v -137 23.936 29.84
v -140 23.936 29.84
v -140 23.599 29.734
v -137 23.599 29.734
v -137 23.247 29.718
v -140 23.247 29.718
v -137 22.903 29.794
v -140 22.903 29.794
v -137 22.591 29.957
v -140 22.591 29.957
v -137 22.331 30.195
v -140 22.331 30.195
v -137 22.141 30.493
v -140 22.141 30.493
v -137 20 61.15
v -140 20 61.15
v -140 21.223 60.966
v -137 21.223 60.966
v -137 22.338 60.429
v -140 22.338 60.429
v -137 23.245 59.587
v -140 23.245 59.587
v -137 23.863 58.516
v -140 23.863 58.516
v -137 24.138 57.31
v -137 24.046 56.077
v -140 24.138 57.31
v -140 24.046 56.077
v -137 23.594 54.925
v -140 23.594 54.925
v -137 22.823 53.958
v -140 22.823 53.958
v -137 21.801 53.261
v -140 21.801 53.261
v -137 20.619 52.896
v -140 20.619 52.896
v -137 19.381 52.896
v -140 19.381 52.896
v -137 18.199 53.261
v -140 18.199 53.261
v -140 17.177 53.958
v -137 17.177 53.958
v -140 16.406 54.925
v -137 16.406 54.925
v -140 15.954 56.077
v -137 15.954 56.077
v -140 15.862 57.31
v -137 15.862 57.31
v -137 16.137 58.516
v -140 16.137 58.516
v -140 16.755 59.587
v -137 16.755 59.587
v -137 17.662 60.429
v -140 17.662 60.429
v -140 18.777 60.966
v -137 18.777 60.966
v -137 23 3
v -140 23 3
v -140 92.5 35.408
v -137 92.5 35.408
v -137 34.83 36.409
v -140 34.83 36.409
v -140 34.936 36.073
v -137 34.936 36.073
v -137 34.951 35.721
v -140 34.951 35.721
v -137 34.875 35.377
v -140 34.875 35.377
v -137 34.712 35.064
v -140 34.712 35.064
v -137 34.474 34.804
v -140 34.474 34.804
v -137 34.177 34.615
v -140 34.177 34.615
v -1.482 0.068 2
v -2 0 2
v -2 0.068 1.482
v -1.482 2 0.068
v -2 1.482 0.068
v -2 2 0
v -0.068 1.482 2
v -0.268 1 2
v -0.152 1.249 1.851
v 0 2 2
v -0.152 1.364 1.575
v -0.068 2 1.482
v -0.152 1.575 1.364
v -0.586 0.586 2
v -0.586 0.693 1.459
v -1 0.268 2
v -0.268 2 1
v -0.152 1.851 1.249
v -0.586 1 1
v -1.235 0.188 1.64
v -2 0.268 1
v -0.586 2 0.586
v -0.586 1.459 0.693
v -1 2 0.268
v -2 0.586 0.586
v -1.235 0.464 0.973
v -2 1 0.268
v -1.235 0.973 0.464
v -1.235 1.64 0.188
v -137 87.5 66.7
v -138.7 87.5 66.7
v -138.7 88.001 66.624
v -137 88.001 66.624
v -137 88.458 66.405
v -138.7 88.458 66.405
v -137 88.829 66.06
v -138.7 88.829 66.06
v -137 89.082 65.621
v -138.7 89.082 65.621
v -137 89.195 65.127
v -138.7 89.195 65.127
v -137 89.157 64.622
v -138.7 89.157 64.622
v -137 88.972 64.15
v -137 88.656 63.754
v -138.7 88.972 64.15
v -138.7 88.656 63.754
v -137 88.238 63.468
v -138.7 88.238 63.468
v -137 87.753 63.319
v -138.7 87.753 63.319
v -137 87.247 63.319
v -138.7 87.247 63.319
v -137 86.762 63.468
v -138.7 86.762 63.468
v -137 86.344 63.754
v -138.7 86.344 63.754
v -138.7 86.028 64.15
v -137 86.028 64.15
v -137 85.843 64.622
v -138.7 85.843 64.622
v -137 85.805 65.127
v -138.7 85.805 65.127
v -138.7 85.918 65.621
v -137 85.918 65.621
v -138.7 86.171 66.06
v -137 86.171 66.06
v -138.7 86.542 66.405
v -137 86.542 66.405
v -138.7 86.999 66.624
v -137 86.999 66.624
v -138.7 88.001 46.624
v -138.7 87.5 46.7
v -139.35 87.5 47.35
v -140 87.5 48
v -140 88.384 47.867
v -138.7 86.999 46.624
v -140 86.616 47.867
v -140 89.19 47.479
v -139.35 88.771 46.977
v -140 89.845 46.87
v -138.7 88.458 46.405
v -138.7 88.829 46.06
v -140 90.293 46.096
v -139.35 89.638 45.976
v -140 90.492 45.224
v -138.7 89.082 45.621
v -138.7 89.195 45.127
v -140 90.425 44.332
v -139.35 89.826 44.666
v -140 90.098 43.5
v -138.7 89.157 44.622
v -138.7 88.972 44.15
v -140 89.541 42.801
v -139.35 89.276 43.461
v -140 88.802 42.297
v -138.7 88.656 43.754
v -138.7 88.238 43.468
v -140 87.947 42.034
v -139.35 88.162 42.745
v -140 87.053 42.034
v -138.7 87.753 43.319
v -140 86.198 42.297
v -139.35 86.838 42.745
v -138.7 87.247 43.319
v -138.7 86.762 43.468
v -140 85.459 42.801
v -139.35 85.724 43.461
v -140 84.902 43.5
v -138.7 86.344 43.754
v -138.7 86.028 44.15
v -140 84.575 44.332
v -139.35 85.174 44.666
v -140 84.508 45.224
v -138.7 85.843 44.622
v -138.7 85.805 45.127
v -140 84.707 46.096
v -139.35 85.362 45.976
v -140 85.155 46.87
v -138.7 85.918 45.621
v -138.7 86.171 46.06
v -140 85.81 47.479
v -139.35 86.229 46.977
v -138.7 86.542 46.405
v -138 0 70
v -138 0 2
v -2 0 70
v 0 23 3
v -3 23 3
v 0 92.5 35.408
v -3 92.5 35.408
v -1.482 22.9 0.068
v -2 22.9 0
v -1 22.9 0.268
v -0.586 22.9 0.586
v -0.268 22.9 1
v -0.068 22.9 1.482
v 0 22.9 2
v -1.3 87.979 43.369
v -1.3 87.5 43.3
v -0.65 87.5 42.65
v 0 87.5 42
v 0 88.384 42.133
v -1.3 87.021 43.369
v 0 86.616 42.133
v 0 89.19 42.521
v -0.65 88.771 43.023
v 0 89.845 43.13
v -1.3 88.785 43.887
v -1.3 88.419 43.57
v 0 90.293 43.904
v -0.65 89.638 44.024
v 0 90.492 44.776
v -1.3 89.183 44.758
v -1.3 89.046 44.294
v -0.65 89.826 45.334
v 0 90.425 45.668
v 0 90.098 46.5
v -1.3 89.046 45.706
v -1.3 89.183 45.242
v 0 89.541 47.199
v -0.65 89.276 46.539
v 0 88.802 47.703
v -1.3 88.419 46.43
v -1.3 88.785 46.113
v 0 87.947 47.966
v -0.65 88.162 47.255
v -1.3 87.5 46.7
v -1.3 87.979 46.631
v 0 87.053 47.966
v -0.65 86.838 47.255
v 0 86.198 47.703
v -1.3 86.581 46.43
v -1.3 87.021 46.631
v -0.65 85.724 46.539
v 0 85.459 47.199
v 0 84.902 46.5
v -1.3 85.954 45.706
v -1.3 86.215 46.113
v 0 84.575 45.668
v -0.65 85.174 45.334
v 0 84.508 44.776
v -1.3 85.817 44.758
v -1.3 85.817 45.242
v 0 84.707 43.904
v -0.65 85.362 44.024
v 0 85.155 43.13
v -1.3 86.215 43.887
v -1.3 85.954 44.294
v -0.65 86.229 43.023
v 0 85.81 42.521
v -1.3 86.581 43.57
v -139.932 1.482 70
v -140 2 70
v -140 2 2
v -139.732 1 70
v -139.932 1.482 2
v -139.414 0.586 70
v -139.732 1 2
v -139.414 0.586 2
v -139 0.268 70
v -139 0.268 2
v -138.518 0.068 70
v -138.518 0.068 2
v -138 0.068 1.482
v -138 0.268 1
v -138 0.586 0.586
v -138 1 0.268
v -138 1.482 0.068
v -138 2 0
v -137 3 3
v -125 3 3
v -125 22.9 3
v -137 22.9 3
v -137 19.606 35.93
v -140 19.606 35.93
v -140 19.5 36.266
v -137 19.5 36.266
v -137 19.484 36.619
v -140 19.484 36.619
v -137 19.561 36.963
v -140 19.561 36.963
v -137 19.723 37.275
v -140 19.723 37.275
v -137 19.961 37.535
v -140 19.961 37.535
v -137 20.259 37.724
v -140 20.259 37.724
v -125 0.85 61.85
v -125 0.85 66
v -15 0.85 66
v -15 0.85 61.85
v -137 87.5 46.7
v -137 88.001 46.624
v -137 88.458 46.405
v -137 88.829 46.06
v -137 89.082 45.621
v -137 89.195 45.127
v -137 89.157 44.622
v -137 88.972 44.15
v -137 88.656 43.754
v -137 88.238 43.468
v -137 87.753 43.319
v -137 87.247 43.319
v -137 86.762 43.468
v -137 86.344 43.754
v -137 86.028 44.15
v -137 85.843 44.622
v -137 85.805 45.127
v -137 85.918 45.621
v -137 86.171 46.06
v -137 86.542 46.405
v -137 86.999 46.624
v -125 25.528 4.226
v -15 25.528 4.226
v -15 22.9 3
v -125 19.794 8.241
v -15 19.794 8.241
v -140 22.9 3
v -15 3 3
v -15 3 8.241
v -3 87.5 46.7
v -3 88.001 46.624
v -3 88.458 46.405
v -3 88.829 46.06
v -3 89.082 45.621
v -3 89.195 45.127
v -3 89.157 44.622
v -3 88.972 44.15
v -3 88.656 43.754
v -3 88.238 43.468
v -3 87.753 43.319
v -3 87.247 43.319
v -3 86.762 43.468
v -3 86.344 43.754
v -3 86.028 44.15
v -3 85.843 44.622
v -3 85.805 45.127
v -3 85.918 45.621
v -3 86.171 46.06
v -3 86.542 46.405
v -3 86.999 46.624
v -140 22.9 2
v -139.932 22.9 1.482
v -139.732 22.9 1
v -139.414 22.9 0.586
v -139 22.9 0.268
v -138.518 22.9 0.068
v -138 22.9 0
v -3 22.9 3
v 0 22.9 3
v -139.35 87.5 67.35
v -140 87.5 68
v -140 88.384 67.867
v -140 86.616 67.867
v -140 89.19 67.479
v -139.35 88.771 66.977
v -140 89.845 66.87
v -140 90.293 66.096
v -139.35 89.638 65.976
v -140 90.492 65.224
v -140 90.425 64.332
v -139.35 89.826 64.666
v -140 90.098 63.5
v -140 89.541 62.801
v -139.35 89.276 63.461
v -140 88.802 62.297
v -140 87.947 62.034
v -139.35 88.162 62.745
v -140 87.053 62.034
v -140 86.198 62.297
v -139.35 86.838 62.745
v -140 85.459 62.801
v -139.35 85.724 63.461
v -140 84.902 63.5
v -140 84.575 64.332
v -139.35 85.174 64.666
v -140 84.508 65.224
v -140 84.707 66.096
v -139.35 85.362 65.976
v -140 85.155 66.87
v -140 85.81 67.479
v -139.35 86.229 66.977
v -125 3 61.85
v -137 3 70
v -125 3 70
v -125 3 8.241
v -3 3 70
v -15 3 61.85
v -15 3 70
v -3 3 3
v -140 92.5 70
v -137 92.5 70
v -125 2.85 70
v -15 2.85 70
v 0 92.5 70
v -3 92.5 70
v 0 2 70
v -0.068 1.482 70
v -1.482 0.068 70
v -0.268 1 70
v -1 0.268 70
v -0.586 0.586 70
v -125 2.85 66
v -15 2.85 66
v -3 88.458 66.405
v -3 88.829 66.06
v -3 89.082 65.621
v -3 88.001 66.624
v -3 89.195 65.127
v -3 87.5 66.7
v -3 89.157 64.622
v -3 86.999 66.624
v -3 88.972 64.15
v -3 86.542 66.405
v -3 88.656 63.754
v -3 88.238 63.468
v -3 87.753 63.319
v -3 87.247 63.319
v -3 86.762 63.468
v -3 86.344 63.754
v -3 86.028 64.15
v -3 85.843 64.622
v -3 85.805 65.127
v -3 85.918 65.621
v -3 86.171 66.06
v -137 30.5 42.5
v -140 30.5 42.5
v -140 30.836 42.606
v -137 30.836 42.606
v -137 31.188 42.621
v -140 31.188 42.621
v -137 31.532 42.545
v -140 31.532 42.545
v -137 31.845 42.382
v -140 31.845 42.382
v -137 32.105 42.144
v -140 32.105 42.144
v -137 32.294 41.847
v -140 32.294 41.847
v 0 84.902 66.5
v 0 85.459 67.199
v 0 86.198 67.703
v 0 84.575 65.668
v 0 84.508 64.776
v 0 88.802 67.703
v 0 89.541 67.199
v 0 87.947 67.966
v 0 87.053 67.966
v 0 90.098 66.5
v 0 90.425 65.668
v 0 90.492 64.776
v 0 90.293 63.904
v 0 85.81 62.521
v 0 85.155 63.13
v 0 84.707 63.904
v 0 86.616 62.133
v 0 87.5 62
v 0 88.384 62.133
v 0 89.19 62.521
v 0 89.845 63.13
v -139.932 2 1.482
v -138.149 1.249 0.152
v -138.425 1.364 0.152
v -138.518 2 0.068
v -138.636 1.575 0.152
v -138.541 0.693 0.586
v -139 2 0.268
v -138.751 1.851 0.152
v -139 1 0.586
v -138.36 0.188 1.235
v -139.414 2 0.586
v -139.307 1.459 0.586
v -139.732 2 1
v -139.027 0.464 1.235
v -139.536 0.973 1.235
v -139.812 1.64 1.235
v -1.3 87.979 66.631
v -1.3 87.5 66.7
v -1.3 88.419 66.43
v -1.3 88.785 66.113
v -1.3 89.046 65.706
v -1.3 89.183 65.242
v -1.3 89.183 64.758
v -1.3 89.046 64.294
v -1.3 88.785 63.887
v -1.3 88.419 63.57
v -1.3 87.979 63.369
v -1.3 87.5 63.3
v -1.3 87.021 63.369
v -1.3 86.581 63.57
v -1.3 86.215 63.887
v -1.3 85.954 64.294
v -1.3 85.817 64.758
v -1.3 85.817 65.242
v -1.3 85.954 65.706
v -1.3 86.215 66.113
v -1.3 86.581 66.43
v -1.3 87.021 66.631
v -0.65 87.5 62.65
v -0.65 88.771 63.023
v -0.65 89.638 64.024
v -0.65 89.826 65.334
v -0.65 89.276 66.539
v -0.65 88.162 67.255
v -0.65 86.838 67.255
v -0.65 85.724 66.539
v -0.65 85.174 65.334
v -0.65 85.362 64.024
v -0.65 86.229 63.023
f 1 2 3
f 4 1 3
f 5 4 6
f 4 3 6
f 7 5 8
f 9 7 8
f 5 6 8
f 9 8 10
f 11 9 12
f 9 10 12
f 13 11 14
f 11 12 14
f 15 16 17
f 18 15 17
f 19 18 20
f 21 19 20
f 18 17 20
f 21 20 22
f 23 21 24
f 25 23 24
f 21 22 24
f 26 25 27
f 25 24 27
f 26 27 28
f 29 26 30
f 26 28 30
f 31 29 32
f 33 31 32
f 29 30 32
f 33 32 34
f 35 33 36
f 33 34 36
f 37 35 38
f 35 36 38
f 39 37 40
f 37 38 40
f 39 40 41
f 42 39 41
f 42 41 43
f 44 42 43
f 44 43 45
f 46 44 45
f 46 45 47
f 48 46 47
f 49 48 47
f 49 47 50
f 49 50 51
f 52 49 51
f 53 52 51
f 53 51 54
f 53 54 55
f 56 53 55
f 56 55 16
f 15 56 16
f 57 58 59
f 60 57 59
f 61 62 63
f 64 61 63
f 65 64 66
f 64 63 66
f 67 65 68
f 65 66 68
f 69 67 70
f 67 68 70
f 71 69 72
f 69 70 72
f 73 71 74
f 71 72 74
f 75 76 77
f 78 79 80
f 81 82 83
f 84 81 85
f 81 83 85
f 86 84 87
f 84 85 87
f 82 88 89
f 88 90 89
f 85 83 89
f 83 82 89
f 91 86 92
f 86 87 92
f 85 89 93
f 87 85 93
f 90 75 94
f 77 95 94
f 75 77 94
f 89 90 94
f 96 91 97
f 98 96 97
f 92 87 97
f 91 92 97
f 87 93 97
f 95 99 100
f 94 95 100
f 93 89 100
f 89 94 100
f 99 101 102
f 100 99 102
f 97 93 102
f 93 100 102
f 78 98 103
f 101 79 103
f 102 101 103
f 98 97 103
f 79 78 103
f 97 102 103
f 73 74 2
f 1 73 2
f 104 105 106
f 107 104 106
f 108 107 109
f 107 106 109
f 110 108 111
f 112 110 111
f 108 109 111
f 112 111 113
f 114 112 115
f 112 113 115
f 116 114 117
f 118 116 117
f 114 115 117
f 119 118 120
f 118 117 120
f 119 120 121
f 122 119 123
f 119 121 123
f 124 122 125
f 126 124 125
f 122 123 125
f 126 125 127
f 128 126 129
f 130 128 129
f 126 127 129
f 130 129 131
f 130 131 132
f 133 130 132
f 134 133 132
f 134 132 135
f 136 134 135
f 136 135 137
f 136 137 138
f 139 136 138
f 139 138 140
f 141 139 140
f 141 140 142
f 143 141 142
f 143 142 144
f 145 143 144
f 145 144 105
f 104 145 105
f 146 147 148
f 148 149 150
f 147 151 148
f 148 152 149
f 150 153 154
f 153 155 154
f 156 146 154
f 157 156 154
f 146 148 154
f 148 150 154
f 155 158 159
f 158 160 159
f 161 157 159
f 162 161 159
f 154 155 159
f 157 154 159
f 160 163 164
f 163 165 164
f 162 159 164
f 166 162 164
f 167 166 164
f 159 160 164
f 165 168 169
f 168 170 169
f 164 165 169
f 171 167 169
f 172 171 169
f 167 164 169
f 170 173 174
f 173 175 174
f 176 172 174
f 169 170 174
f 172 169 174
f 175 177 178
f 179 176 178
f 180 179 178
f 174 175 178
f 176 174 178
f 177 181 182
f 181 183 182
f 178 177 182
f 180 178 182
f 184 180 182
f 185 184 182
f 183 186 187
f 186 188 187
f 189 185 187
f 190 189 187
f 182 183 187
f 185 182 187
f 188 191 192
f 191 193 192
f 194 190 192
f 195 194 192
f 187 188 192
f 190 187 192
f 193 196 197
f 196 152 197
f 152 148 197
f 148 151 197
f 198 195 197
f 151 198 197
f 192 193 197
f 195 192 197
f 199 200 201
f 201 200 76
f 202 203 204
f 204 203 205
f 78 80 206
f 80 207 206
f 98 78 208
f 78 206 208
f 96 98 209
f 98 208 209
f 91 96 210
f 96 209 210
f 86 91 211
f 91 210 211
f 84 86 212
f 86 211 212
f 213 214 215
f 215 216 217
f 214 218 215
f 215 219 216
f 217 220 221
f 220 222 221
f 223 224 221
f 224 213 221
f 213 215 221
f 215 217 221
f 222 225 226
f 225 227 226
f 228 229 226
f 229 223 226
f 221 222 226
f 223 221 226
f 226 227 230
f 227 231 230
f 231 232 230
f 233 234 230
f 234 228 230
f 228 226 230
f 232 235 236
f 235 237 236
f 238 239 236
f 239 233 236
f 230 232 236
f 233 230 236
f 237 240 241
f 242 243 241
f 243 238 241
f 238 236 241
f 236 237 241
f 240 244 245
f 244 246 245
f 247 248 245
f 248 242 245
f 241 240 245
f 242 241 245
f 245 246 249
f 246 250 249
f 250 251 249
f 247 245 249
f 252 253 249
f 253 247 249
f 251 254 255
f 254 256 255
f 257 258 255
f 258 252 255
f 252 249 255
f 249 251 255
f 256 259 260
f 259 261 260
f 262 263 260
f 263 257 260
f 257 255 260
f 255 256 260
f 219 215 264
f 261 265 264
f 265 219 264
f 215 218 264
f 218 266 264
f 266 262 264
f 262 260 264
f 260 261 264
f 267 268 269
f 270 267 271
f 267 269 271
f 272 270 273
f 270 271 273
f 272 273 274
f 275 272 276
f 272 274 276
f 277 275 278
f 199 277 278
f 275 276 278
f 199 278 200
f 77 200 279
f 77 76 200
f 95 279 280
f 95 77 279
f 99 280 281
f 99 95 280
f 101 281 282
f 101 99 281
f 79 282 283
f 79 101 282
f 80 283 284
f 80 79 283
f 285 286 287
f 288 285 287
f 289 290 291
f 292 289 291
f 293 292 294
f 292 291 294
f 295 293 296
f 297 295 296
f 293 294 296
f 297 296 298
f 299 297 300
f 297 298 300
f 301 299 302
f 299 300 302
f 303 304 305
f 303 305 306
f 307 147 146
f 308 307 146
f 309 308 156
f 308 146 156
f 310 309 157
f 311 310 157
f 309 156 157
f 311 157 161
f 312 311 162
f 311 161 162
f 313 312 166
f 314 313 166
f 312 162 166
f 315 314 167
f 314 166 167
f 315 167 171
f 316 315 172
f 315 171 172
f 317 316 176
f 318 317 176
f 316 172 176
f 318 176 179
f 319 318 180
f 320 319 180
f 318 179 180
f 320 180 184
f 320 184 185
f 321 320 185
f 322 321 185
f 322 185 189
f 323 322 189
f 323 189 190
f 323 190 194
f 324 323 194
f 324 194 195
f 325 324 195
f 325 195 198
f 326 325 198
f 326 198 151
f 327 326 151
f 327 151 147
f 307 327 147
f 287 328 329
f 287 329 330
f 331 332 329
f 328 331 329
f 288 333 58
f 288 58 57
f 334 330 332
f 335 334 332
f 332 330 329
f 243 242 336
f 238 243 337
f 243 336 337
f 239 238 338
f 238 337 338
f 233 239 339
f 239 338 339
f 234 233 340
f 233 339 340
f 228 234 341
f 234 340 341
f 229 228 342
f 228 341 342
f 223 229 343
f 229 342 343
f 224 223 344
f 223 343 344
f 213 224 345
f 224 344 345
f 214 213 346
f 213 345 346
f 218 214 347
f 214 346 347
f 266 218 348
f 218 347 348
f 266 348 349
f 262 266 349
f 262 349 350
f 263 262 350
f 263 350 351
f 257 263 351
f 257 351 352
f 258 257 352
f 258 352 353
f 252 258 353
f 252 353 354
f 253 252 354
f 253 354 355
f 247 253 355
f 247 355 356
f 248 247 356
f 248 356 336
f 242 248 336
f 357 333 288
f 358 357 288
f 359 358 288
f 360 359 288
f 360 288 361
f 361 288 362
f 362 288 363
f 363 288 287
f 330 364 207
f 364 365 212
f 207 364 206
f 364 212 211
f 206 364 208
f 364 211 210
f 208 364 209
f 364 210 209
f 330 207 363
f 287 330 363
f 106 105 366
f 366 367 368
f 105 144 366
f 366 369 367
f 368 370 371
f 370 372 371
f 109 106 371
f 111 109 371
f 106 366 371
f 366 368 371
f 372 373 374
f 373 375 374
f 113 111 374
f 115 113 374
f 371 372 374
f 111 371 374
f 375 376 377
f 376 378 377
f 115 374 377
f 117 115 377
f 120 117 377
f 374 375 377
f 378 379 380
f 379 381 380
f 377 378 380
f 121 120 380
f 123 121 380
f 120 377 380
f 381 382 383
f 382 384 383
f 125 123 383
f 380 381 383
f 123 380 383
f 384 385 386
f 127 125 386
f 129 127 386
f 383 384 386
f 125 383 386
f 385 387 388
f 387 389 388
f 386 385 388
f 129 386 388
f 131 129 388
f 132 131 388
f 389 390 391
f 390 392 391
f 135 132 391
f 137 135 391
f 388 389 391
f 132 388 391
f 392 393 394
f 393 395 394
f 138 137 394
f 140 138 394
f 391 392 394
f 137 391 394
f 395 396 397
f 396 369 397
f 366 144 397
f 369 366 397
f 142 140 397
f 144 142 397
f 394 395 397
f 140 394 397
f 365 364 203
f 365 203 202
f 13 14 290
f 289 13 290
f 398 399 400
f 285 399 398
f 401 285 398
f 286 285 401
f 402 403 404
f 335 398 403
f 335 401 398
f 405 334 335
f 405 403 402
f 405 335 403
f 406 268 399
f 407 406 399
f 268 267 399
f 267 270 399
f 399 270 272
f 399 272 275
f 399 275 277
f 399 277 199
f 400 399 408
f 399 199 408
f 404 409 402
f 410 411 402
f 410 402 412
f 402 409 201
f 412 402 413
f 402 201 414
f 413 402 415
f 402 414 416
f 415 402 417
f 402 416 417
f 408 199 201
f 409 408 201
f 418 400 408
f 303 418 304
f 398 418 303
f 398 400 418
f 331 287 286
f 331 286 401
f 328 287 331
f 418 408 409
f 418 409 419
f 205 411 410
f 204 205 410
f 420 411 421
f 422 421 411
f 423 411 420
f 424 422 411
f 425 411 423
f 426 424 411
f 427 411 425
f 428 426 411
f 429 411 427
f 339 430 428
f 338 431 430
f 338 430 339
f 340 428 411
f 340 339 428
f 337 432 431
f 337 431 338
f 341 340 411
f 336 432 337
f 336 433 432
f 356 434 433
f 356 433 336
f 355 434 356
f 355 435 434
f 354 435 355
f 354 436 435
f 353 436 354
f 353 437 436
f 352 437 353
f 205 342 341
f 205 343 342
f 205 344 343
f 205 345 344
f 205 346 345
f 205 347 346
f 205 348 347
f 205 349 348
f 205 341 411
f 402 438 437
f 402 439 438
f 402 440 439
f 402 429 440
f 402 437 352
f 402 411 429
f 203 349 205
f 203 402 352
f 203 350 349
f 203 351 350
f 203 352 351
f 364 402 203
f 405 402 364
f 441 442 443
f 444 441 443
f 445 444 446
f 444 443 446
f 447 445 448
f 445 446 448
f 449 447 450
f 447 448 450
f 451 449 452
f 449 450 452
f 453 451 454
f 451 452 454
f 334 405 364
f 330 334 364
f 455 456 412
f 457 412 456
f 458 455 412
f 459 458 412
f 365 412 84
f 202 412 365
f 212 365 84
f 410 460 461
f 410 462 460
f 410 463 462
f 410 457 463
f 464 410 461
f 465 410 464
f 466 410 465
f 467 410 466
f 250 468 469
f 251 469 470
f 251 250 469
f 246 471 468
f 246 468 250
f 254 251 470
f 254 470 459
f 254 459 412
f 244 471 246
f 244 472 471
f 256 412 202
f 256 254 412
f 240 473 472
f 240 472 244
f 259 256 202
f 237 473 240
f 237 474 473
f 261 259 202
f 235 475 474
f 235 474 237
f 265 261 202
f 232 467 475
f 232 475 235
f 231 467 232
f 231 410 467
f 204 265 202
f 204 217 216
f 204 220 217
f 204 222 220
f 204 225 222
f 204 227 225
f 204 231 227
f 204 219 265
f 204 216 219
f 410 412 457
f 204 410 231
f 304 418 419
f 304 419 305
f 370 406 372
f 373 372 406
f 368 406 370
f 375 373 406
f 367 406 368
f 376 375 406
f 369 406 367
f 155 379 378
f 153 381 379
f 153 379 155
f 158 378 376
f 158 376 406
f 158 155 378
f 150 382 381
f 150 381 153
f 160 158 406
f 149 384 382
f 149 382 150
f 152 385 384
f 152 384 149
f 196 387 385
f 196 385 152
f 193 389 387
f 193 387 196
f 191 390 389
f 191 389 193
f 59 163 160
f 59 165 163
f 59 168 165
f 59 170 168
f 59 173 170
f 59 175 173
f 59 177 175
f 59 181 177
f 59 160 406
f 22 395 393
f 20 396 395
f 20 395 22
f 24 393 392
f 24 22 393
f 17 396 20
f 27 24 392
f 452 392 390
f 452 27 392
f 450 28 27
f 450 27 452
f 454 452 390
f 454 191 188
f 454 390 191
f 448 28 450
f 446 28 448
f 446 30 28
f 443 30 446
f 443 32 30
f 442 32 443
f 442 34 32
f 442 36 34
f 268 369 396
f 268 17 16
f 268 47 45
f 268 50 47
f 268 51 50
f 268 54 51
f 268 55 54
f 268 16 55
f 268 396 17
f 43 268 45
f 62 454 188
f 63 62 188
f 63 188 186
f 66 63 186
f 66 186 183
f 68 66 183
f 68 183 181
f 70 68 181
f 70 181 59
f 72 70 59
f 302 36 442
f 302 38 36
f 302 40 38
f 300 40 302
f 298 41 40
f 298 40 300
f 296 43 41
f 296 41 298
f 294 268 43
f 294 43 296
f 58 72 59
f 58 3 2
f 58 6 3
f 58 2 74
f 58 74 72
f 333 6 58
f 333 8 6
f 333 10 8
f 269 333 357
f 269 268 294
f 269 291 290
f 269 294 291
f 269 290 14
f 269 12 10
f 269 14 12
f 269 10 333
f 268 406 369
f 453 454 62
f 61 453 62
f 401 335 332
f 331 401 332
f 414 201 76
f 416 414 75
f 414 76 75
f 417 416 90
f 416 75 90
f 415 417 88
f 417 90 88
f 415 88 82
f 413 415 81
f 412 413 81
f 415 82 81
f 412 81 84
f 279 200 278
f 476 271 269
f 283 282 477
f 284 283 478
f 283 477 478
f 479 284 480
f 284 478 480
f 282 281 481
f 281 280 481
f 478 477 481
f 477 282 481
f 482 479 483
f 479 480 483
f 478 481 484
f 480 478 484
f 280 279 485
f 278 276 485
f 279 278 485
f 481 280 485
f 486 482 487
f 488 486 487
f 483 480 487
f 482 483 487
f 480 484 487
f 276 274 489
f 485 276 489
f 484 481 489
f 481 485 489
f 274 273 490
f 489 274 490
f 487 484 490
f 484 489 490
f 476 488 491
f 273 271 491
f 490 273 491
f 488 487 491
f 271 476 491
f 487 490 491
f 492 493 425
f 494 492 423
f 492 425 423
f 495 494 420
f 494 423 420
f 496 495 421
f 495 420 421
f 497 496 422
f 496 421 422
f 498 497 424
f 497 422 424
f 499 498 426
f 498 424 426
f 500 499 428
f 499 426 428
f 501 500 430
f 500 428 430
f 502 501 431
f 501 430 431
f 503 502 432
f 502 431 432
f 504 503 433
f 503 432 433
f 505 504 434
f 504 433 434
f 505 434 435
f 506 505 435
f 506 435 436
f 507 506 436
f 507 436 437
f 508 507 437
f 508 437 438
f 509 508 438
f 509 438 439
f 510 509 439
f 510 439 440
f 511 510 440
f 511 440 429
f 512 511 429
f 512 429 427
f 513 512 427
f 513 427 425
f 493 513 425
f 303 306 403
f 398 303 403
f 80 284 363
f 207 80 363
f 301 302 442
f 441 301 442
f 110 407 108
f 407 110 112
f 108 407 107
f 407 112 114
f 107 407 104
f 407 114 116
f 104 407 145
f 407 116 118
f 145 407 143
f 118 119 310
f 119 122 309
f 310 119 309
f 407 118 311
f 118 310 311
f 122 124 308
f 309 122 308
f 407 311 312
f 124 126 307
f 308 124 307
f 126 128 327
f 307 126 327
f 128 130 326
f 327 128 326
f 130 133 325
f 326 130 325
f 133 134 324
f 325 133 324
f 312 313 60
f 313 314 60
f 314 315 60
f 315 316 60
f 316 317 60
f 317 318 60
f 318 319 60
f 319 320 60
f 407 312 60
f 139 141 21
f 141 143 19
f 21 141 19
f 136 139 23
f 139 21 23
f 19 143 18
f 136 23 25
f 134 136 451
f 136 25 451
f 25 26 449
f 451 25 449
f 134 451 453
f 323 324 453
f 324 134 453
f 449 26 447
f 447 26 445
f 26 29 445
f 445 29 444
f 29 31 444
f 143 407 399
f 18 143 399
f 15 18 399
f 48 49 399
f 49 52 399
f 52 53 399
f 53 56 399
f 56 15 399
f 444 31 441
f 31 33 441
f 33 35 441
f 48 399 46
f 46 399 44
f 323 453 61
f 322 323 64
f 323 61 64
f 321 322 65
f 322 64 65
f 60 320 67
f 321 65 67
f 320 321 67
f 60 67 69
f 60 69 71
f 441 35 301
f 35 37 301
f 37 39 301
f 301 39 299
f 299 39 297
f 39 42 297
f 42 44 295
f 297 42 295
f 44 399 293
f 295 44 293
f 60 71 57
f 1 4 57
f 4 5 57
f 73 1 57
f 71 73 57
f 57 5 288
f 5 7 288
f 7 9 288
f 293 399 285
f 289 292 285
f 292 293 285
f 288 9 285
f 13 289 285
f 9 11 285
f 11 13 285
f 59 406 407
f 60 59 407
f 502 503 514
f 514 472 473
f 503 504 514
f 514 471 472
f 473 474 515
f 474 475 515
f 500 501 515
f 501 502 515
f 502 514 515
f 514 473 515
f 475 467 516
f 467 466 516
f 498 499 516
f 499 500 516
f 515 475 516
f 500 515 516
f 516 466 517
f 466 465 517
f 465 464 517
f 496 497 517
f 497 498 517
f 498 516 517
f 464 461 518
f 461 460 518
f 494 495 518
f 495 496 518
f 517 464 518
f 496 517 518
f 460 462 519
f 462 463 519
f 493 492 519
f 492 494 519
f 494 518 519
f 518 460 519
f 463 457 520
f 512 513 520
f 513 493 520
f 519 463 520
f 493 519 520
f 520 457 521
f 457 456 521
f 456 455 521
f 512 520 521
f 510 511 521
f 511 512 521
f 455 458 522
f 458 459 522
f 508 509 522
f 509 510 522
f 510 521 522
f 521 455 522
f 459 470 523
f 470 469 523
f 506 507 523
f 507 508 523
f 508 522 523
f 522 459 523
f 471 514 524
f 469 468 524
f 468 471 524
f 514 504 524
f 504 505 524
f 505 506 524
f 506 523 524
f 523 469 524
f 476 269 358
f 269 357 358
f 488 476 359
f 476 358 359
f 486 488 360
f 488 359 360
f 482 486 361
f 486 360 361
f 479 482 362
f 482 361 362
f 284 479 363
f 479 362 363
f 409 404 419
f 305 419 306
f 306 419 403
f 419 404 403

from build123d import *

# Parameters (mm, degrees)
SCHIZZO1_W                         = 140
SCHIZZO1_H                         = 70
ESTRUSIONE_ESTRUSIONE1_DEPTH       = 3
ESTRUSIONE_ESTRUSIONE2_DEPTH       = 110
SCHIZZO4_W                         = 3
SCHIZZO4_H                         = 19.9
ESTRUSIONE_ESTRUSIONE3_DEPTH       = 140
SCHIZZO5_W                         = 3
SCHIZZO5_H                         = 67
ESTRUSIONE_ESTRUSIONE4_DEPTH       = 89.5
TAGLIO_ESTRUSIONE1_REACH           = 183.814
TAGLIO_ESTRUSIONE3_DEPTH           = 110
RACCORDO1_R                        = 2
SCHIZZO8_R                         = 1.7
TAGLIO_ESTRUSIONE4_DEPTH           = 182.813778356
SCHIZZO10_R                        = 3
TAGLIO_ESTRUSIONE5_DEPTH           = 2
TAGLIO_ESTRUSIONE5_DRAFT           = -45
TAGLIO_ESTRUSIONE5_PROFILE_2_DEPTH = 2
TAGLIO_ESTRUSIONE5_PROFILE_2_DRAFT = -45
SCHIZZO11_R                        = 3
TAGLIO_ESTRUSIONE6_DEPTH           = 2
TAGLIO_ESTRUSIONE6_DRAFT           = -45
TAGLIO_ESTRUSIONE6_PROFILE_2_DEPTH = 2
TAGLIO_ESTRUSIONE6_PROFILE_2_DRAFT = -45
TAGLIO_ESTRUSIONE7_DEPTH           = 3
SCHIZZO13_R                        = 4.15
TAGLIO_ESTRUSIONE8_DEPTH           = 10


with BuildPart() as part:
    # Schizzo1 → Estrusione-Estrusione1 (new body)
    with BuildSketch(Plane(origin=(0, 0, 0), x_dir=(1, 0, 0), z_dir=(0, 1, 0))):
        with Locations((-70, -35)):
            Rectangle(SCHIZZO1_W, SCHIZZO1_H)
    extrude(amount=ESTRUSIONE_ESTRUSIONE1_DEPTH)

    # Schizzo2 → Estrusione-Estrusione2 (add)
    with BuildSketch(Plane(origin=(-15, 0, 0), x_dir=(0, 0, -1), z_dir=(1, 0, 0))):
        Polygon((-8.240628014, 3), (-8.240628014, 19.794228272), (-4.225592959, 25.528292582), (-3, 22.9), (-3, 3), align=None)
    extrude(amount=-ESTRUSIONE_ESTRUSIONE2_DEPTH)

    # Schizzo4 → Estrusione-Estrusione3 (add)
    with BuildSketch(Plane(origin=(0, 0, 0), x_dir=(0, 0, -1), z_dir=(1, 0, 0))):
        with Locations((-1.5, 12.95)):
            Rectangle(SCHIZZO4_W, SCHIZZO4_H)
    extrude(amount=-ESTRUSIONE_ESTRUSIONE3_DEPTH)

    # Schizzo5 → Estrusione-Estrusione4 (add)
    with BuildSketch(Plane(origin=(0, 3, 0), x_dir=(1, 0, 0), z_dir=(0, 1, 0))):
        with Locations((-138.5, -36.5)):
            Rectangle(SCHIZZO5_W, SCHIZZO5_H)
        with Locations((-1.5, -36.5)):
            Rectangle(SCHIZZO5_W, SCHIZZO5_H)
    extrude(amount=ESTRUSIONE_ESTRUSIONE4_DEPTH)

    # Taglio-Estrusione1: up to this face of the body (flat: up to its plane)
    taglio_estrusione1_end = Plane(part.part.faces().sort_by_distance((0, 45.868467333, 36.116274616))[0])
    # Schizzo6 → Taglio-Estrusione1 (cut, up to the picked face)
    with BuildSketch(Plane.ZY.offset(140), mode=Mode.PRIVATE) as taglio_estrusione1_sk1:
        Polygon((3, 23), (35.408382242, 92.5), (3, 92.5), align=None)
    taglio_estrusione1_tool1 = split(extrude(taglio_estrusione1_sk1.sketch, amount=-TAGLIO_ESTRUSIONE1_REACH, mode=Mode.PRIVATE), bisect_by=taglio_estrusione1_end, keep=Keep.BOTH, mode=Mode.PRIVATE)
    add(taglio_estrusione1_tool1.solids().sort_by(Axis((-140, 69.333333, 13.802794), (1, 0, 0)))[0], mode=Mode.SUBTRACT)

    # Schizzo7 → Taglio-Estrusione3 (cut)
    with BuildSketch(Plane.ZY.offset(125)):
        Polygon((61.85, 3), (70, 3), (70, 2.85), (66, 2.85), (66, 0.85), (61.85, 0.85), align=None)
    extrude(amount=-TAGLIO_ESTRUSIONE3_DEPTH, mode=Mode.SUBTRACT)

    # Raccordo1
    raccordo1_edges = [part.edges().sort_by_distance(p)[0] for p in [
        (-140, 0, 35),
        (-70, 0, 0),
        (0, 0, 35),
        (-140, 11.45, 0),
        (0, 11.45, 0),
    ]]
    fillet(raccordo1_edges, radius=RACCORDO1_R)

    # Schizzo8 → Taglio-Estrusione4 (cut, through all)
    with BuildSketch(Plane.ZY.offset(140)):
        with Locations((45, 87.5)):
            Circle(SCHIZZO8_R)
        with Locations((65, 87.5)):
            Circle(SCHIZZO8_R)
    extrude(amount=-TAGLIO_ESTRUSIONE4_DEPTH, mode=Mode.SUBTRACT)


with BuildPart() as taglio_estrusione5_tool:
    # Schizzo10 → Taglio-Estrusione5 (with draft: the straight prism first)
    with BuildSketch(Plane.ZY.offset(140)):
        with Locations((45, 87.5)):
            Circle(SCHIZZO10_R)
    extrude(amount=-TAGLIO_ESTRUSIONE5_DEPTH)
    # Taglio-Estrusione5: the draft: its side faces are tilted about the plane it starts from
    taglio_estrusione5_sides = [taglio_estrusione5_tool.faces().sort_by_distance(p)[0] for p in [
        (-139, 87.5, 42),
    ]]
    draft(taglio_estrusione5_sides, Plane.ZY.offset(140), TAGLIO_ESTRUSIONE5_DRAFT)


with BuildPart() as part_1:
    add(part.part)

    # Taglio-Estrusione5: cut by taglio_estrusione5_tool
    add(taglio_estrusione5_tool.part, mode=Mode.SUBTRACT)


with BuildPart() as taglio_estrusione5_profile_2_tool:
    # Schizzo10 → Taglio-Estrusione5 profile 2 (with draft: the straight prism first)
    with BuildSketch(Plane.ZY.offset(140)):
        with Locations((65, 87.5)):
            Circle(SCHIZZO10_R)
    extrude(amount=-TAGLIO_ESTRUSIONE5_PROFILE_2_DEPTH)
    # Taglio-Estrusione5 profile 2: the draft: its side faces are tilted about the plane it starts from
    taglio_estrusione5_profile_2_sides = [taglio_estrusione5_profile_2_tool.faces().sort_by_distance(p)[0] for p in [
        (-139, 87.5, 62),
    ]]
    draft(taglio_estrusione5_profile_2_sides, Plane.ZY.offset(140), TAGLIO_ESTRUSIONE5_PROFILE_2_DRAFT)


with BuildPart() as part_2:
    add(part_1.part)

    # Taglio-Estrusione5 profile 2: cut by taglio_estrusione5_profile_2_tool
    add(taglio_estrusione5_profile_2_tool.part, mode=Mode.SUBTRACT)


with BuildPart() as taglio_estrusione6_tool:
    # Schizzo11 → Taglio-Estrusione6 (with draft: the straight prism first)
    with BuildSketch(Plane(origin=(0, 0, 0), x_dir=(0, 0, -1), z_dir=(1, 0, 0))):
        with Locations((-65, 87.5)):
            Circle(SCHIZZO11_R)
    extrude(amount=-TAGLIO_ESTRUSIONE6_DEPTH)
    # Taglio-Estrusione6: the draft: its side faces are tilted about the plane it starts from
    taglio_estrusione6_sides = [taglio_estrusione6_tool.faces().sort_by_distance(p)[0] for p in [
        (-1, 87.5, 68),
    ]]
    draft(taglio_estrusione6_sides, Plane(origin=(0, 0, 0), x_dir=(0, 0, -1), z_dir=(1, 0, 0)), TAGLIO_ESTRUSIONE6_DRAFT)


with BuildPart() as part_3:
    add(part_2.part)

    # Taglio-Estrusione6: cut by taglio_estrusione6_tool
    add(taglio_estrusione6_tool.part, mode=Mode.SUBTRACT)


with BuildPart() as taglio_estrusione6_profile_2_tool:
    # Schizzo11 → Taglio-Estrusione6 profile 2 (with draft: the straight prism first)
    with BuildSketch(Plane(origin=(0, 0, 0), x_dir=(0, 0, -1), z_dir=(1, 0, 0))):
        with Locations((-45, 87.5)):
            Circle(SCHIZZO11_R)
    extrude(amount=-TAGLIO_ESTRUSIONE6_PROFILE_2_DEPTH)
    # Taglio-Estrusione6 profile 2: the draft: its side faces are tilted about the plane it starts from
    taglio_estrusione6_profile_2_sides = [taglio_estrusione6_profile_2_tool.faces().sort_by_distance(p)[0] for p in [
        (-1, 87.5, 48),
    ]]
    draft(taglio_estrusione6_profile_2_sides, Plane(origin=(0, 0, 0), x_dir=(0, 0, -1), z_dir=(1, 0, 0)), TAGLIO_ESTRUSIONE6_PROFILE_2_DRAFT)


with BuildPart() as part_4:
    add(part_3.part)

    # Taglio-Estrusione6 profile 2: cut by taglio_estrusione6_profile_2_tool
    add(taglio_estrusione6_profile_2_tool.part, mode=Mode.SUBTRACT)

    # Schizzo12 → Taglio-Estrusione7 (cut)
    with BuildSketch(Plane.ZY.offset(140)):
        with BuildLine():
            Line((37.724413642, 20.258722006), (42.5, 30.5))
            ThreePointArc((42.5, 30.5), (42.545069526, 31.532261847), (41.847019141, 32.294050166))
            Line((41.847019141, 32.294050166), (36.409172419, 34.829759736))
            ThreePointArc((36.409172419, 34.829759736), (35.376910572, 34.874829262), (34.615122253, 34.176778877))
            Line((34.615122253, 34.176778877), (29.839535895, 23.935500884))
            ThreePointArc((29.839535895, 23.935500884), (29.79446637, 22.903239037), (30.492516754, 22.141450718))
            Line((30.492516754, 22.141450718), (35.930363476, 19.605741147))
            ThreePointArc((35.930363476, 19.605741147), (36.962625323, 19.560671622), (37.724413642, 20.258722006))
        make_face()
    extrude(amount=-TAGLIO_ESTRUSIONE7_DEPTH, mode=Mode.SUBTRACT)

    # Schizzo13 → Taglio-Estrusione8 (cut)
    with BuildSketch(Plane.ZY.offset(140)):
        with Locations((57, 20)):
            Circle(SCHIZZO13_R)
    extrude(amount=-TAGLIO_ESTRUSIONE8_DEPTH, mode=Mode.SUBTRACT)


solid = part_4.part
